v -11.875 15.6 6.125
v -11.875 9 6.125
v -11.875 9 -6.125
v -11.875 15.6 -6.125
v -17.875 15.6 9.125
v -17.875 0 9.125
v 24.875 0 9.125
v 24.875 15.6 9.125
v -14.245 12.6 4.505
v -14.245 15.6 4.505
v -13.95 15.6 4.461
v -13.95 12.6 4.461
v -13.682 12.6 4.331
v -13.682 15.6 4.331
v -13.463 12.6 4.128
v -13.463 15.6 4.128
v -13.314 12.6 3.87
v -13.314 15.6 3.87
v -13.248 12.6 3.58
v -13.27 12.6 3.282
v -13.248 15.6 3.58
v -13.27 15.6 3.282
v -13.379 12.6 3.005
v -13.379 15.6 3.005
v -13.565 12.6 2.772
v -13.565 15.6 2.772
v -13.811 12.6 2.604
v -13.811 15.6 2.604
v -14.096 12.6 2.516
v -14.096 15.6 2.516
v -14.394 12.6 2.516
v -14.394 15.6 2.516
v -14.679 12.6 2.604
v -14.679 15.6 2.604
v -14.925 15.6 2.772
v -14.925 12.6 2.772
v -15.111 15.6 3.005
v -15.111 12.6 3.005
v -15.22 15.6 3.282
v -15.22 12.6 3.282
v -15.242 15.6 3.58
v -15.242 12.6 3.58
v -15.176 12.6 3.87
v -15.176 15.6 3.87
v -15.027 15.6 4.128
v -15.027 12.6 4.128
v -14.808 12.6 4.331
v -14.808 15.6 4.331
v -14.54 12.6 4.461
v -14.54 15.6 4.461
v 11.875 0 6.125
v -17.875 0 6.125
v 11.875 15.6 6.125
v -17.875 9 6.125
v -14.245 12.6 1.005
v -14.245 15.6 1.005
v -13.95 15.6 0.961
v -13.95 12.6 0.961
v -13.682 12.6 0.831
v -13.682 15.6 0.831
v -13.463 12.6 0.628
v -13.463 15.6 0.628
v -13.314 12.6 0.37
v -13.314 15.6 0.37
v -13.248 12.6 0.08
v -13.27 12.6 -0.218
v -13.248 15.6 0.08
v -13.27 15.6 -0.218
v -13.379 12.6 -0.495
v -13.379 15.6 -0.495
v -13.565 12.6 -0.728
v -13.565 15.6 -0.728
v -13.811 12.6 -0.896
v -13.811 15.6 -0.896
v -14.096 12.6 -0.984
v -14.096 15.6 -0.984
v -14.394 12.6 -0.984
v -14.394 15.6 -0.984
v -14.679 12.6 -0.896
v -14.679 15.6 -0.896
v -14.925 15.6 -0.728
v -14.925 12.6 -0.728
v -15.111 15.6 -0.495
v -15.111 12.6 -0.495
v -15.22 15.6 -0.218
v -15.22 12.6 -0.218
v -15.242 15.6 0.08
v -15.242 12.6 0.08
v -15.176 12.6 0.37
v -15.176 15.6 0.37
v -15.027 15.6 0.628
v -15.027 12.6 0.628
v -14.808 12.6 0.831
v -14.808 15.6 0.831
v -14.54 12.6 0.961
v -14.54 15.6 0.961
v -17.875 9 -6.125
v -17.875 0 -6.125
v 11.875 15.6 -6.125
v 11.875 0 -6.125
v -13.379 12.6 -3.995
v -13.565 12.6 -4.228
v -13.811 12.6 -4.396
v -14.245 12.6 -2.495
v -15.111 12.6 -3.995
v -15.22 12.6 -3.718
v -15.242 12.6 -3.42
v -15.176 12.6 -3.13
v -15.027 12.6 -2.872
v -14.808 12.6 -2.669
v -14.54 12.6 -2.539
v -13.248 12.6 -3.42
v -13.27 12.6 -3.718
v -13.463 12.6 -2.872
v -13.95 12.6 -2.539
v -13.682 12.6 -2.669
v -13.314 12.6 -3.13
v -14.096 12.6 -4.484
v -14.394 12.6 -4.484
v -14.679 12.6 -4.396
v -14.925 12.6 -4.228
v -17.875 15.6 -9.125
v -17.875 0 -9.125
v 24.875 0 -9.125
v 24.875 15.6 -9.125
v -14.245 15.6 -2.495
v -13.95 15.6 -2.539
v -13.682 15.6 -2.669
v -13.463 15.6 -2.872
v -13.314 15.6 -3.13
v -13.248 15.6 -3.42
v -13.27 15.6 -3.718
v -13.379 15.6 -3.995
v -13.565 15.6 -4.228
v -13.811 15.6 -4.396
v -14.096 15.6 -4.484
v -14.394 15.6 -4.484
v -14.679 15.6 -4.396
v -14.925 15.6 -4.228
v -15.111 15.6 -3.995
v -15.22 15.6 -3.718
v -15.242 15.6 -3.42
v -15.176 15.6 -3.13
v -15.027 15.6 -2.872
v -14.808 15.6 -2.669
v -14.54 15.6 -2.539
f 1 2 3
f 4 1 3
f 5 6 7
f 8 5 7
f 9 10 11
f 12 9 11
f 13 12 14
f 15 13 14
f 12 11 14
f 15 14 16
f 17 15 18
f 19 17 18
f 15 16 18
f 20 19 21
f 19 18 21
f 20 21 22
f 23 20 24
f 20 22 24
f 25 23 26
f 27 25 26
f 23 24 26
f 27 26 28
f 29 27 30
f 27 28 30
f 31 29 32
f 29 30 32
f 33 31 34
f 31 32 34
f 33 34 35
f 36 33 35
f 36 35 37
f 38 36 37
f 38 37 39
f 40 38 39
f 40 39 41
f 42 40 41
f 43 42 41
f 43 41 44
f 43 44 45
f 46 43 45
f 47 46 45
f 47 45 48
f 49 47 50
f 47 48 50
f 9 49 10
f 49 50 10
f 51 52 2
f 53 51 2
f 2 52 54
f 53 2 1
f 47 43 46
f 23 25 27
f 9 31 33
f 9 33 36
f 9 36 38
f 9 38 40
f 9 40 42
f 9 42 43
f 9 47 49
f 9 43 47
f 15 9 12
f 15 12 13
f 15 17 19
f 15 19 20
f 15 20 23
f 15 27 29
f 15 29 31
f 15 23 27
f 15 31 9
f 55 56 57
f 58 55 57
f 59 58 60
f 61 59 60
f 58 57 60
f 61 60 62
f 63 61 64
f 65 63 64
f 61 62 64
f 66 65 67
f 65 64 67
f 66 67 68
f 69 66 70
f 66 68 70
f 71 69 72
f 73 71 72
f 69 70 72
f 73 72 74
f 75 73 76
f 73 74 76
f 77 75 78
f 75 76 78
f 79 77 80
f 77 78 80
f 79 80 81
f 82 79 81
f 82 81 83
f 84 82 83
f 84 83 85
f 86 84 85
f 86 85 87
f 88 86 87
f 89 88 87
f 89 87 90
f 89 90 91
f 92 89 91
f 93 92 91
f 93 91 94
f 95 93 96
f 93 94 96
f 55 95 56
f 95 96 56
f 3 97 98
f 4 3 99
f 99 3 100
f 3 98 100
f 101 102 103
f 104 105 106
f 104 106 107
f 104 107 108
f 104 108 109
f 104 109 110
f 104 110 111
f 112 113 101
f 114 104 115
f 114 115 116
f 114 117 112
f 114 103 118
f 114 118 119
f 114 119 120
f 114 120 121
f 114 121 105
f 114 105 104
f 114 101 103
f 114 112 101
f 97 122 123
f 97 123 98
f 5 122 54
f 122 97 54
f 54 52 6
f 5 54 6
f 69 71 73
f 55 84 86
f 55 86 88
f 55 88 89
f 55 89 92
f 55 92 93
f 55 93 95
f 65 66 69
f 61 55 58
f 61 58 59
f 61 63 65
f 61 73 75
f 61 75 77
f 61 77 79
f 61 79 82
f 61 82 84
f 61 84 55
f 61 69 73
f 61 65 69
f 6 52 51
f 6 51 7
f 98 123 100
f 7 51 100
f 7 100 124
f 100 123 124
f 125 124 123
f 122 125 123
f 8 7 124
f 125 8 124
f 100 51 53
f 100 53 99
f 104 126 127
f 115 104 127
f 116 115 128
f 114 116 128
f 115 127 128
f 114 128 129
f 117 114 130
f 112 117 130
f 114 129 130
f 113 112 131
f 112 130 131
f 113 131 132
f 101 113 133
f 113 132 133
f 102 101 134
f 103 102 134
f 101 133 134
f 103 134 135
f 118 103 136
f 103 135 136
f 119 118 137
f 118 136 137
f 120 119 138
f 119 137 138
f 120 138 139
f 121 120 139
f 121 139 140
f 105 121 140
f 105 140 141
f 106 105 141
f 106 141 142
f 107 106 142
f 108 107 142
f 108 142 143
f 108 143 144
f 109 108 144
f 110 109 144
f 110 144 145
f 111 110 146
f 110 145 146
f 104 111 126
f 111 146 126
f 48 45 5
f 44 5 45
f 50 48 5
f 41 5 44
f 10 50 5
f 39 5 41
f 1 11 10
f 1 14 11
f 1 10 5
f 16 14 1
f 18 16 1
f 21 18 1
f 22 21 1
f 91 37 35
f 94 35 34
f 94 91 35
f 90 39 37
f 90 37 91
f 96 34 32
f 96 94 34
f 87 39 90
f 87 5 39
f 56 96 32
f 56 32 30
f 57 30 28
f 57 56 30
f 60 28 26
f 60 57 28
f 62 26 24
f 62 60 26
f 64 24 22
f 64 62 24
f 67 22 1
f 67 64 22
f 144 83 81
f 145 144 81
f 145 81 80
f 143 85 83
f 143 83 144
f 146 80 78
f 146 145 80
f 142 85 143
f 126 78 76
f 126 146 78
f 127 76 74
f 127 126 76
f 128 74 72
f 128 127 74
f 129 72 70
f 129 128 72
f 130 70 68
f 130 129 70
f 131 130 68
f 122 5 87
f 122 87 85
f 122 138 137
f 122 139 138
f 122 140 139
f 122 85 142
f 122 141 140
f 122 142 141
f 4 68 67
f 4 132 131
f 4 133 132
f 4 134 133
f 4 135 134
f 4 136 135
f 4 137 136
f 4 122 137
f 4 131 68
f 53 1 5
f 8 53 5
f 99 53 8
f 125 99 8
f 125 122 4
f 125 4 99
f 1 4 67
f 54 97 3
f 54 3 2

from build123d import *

# Parameters (mm, degrees)
SKETCH1_W           = 23.75
SKETCH1_H           = 12.25
BOSS_EXTRUDE1_DEPTH = 15.6
SKETCH2_W           = 12.25
SKETCH2_H           = 9
CUT_EXTRUDE1_DEPTH  = 10
SKETCH3_R           = 1
CUT_EXTRUDE2_DEPTH  = 3


with BuildPart() as part:
    # Sketch1 → Boss-Extrude1 (new body)
    with BuildSketch(Plane(origin=(0, 0, 0), x_dir=(1, 0, 0), z_dir=(0, 1, 0))):
        Polygon((17.875, -9.125), (24.875, -9.125), (24.875, 9.125), (17.875, 9.125), (-17.875, 9.125), (-17.875, -9.125), align=None)
        Rectangle(SKETCH1_W, SKETCH1_H, mode=Mode.SUBTRACT)
    extrude(amount=BOSS_EXTRUDE1_DEPTH)

    # Sketch2 → Cut-Extrude1 (cut)
    with BuildSketch(Plane.ZY.offset(17.875)):
        with Locations((0, 4.5)):
            Rectangle(SKETCH2_W, SKETCH2_H)
    extrude(amount=-CUT_EXTRUDE1_DEPTH, mode=Mode.SUBTRACT)

    # Sketch3 → Cut-Extrude2 (cut)
    with BuildSketch(Plane(origin=(0, 15.6, 0), x_dir=(1, 0, 0), z_dir=(0, 1, 0))):
        with Locations(Location((-14.245, 3.495, 0), (0, 0, 270))):
            Circle(SKETCH3_R)
        with Locations(Location((-14.245, -0.005, 0), (0, 0, 270))):
            Circle(SKETCH3_R)
        with Locations(Location((-14.245, -3.505, 0), (0, 0, 270))):
            Circle(SKETCH3_R)
    extrude(amount=-CUT_EXTRUDE2_DEPTH, mode=Mode.SUBTRACT)


solid = part.part
